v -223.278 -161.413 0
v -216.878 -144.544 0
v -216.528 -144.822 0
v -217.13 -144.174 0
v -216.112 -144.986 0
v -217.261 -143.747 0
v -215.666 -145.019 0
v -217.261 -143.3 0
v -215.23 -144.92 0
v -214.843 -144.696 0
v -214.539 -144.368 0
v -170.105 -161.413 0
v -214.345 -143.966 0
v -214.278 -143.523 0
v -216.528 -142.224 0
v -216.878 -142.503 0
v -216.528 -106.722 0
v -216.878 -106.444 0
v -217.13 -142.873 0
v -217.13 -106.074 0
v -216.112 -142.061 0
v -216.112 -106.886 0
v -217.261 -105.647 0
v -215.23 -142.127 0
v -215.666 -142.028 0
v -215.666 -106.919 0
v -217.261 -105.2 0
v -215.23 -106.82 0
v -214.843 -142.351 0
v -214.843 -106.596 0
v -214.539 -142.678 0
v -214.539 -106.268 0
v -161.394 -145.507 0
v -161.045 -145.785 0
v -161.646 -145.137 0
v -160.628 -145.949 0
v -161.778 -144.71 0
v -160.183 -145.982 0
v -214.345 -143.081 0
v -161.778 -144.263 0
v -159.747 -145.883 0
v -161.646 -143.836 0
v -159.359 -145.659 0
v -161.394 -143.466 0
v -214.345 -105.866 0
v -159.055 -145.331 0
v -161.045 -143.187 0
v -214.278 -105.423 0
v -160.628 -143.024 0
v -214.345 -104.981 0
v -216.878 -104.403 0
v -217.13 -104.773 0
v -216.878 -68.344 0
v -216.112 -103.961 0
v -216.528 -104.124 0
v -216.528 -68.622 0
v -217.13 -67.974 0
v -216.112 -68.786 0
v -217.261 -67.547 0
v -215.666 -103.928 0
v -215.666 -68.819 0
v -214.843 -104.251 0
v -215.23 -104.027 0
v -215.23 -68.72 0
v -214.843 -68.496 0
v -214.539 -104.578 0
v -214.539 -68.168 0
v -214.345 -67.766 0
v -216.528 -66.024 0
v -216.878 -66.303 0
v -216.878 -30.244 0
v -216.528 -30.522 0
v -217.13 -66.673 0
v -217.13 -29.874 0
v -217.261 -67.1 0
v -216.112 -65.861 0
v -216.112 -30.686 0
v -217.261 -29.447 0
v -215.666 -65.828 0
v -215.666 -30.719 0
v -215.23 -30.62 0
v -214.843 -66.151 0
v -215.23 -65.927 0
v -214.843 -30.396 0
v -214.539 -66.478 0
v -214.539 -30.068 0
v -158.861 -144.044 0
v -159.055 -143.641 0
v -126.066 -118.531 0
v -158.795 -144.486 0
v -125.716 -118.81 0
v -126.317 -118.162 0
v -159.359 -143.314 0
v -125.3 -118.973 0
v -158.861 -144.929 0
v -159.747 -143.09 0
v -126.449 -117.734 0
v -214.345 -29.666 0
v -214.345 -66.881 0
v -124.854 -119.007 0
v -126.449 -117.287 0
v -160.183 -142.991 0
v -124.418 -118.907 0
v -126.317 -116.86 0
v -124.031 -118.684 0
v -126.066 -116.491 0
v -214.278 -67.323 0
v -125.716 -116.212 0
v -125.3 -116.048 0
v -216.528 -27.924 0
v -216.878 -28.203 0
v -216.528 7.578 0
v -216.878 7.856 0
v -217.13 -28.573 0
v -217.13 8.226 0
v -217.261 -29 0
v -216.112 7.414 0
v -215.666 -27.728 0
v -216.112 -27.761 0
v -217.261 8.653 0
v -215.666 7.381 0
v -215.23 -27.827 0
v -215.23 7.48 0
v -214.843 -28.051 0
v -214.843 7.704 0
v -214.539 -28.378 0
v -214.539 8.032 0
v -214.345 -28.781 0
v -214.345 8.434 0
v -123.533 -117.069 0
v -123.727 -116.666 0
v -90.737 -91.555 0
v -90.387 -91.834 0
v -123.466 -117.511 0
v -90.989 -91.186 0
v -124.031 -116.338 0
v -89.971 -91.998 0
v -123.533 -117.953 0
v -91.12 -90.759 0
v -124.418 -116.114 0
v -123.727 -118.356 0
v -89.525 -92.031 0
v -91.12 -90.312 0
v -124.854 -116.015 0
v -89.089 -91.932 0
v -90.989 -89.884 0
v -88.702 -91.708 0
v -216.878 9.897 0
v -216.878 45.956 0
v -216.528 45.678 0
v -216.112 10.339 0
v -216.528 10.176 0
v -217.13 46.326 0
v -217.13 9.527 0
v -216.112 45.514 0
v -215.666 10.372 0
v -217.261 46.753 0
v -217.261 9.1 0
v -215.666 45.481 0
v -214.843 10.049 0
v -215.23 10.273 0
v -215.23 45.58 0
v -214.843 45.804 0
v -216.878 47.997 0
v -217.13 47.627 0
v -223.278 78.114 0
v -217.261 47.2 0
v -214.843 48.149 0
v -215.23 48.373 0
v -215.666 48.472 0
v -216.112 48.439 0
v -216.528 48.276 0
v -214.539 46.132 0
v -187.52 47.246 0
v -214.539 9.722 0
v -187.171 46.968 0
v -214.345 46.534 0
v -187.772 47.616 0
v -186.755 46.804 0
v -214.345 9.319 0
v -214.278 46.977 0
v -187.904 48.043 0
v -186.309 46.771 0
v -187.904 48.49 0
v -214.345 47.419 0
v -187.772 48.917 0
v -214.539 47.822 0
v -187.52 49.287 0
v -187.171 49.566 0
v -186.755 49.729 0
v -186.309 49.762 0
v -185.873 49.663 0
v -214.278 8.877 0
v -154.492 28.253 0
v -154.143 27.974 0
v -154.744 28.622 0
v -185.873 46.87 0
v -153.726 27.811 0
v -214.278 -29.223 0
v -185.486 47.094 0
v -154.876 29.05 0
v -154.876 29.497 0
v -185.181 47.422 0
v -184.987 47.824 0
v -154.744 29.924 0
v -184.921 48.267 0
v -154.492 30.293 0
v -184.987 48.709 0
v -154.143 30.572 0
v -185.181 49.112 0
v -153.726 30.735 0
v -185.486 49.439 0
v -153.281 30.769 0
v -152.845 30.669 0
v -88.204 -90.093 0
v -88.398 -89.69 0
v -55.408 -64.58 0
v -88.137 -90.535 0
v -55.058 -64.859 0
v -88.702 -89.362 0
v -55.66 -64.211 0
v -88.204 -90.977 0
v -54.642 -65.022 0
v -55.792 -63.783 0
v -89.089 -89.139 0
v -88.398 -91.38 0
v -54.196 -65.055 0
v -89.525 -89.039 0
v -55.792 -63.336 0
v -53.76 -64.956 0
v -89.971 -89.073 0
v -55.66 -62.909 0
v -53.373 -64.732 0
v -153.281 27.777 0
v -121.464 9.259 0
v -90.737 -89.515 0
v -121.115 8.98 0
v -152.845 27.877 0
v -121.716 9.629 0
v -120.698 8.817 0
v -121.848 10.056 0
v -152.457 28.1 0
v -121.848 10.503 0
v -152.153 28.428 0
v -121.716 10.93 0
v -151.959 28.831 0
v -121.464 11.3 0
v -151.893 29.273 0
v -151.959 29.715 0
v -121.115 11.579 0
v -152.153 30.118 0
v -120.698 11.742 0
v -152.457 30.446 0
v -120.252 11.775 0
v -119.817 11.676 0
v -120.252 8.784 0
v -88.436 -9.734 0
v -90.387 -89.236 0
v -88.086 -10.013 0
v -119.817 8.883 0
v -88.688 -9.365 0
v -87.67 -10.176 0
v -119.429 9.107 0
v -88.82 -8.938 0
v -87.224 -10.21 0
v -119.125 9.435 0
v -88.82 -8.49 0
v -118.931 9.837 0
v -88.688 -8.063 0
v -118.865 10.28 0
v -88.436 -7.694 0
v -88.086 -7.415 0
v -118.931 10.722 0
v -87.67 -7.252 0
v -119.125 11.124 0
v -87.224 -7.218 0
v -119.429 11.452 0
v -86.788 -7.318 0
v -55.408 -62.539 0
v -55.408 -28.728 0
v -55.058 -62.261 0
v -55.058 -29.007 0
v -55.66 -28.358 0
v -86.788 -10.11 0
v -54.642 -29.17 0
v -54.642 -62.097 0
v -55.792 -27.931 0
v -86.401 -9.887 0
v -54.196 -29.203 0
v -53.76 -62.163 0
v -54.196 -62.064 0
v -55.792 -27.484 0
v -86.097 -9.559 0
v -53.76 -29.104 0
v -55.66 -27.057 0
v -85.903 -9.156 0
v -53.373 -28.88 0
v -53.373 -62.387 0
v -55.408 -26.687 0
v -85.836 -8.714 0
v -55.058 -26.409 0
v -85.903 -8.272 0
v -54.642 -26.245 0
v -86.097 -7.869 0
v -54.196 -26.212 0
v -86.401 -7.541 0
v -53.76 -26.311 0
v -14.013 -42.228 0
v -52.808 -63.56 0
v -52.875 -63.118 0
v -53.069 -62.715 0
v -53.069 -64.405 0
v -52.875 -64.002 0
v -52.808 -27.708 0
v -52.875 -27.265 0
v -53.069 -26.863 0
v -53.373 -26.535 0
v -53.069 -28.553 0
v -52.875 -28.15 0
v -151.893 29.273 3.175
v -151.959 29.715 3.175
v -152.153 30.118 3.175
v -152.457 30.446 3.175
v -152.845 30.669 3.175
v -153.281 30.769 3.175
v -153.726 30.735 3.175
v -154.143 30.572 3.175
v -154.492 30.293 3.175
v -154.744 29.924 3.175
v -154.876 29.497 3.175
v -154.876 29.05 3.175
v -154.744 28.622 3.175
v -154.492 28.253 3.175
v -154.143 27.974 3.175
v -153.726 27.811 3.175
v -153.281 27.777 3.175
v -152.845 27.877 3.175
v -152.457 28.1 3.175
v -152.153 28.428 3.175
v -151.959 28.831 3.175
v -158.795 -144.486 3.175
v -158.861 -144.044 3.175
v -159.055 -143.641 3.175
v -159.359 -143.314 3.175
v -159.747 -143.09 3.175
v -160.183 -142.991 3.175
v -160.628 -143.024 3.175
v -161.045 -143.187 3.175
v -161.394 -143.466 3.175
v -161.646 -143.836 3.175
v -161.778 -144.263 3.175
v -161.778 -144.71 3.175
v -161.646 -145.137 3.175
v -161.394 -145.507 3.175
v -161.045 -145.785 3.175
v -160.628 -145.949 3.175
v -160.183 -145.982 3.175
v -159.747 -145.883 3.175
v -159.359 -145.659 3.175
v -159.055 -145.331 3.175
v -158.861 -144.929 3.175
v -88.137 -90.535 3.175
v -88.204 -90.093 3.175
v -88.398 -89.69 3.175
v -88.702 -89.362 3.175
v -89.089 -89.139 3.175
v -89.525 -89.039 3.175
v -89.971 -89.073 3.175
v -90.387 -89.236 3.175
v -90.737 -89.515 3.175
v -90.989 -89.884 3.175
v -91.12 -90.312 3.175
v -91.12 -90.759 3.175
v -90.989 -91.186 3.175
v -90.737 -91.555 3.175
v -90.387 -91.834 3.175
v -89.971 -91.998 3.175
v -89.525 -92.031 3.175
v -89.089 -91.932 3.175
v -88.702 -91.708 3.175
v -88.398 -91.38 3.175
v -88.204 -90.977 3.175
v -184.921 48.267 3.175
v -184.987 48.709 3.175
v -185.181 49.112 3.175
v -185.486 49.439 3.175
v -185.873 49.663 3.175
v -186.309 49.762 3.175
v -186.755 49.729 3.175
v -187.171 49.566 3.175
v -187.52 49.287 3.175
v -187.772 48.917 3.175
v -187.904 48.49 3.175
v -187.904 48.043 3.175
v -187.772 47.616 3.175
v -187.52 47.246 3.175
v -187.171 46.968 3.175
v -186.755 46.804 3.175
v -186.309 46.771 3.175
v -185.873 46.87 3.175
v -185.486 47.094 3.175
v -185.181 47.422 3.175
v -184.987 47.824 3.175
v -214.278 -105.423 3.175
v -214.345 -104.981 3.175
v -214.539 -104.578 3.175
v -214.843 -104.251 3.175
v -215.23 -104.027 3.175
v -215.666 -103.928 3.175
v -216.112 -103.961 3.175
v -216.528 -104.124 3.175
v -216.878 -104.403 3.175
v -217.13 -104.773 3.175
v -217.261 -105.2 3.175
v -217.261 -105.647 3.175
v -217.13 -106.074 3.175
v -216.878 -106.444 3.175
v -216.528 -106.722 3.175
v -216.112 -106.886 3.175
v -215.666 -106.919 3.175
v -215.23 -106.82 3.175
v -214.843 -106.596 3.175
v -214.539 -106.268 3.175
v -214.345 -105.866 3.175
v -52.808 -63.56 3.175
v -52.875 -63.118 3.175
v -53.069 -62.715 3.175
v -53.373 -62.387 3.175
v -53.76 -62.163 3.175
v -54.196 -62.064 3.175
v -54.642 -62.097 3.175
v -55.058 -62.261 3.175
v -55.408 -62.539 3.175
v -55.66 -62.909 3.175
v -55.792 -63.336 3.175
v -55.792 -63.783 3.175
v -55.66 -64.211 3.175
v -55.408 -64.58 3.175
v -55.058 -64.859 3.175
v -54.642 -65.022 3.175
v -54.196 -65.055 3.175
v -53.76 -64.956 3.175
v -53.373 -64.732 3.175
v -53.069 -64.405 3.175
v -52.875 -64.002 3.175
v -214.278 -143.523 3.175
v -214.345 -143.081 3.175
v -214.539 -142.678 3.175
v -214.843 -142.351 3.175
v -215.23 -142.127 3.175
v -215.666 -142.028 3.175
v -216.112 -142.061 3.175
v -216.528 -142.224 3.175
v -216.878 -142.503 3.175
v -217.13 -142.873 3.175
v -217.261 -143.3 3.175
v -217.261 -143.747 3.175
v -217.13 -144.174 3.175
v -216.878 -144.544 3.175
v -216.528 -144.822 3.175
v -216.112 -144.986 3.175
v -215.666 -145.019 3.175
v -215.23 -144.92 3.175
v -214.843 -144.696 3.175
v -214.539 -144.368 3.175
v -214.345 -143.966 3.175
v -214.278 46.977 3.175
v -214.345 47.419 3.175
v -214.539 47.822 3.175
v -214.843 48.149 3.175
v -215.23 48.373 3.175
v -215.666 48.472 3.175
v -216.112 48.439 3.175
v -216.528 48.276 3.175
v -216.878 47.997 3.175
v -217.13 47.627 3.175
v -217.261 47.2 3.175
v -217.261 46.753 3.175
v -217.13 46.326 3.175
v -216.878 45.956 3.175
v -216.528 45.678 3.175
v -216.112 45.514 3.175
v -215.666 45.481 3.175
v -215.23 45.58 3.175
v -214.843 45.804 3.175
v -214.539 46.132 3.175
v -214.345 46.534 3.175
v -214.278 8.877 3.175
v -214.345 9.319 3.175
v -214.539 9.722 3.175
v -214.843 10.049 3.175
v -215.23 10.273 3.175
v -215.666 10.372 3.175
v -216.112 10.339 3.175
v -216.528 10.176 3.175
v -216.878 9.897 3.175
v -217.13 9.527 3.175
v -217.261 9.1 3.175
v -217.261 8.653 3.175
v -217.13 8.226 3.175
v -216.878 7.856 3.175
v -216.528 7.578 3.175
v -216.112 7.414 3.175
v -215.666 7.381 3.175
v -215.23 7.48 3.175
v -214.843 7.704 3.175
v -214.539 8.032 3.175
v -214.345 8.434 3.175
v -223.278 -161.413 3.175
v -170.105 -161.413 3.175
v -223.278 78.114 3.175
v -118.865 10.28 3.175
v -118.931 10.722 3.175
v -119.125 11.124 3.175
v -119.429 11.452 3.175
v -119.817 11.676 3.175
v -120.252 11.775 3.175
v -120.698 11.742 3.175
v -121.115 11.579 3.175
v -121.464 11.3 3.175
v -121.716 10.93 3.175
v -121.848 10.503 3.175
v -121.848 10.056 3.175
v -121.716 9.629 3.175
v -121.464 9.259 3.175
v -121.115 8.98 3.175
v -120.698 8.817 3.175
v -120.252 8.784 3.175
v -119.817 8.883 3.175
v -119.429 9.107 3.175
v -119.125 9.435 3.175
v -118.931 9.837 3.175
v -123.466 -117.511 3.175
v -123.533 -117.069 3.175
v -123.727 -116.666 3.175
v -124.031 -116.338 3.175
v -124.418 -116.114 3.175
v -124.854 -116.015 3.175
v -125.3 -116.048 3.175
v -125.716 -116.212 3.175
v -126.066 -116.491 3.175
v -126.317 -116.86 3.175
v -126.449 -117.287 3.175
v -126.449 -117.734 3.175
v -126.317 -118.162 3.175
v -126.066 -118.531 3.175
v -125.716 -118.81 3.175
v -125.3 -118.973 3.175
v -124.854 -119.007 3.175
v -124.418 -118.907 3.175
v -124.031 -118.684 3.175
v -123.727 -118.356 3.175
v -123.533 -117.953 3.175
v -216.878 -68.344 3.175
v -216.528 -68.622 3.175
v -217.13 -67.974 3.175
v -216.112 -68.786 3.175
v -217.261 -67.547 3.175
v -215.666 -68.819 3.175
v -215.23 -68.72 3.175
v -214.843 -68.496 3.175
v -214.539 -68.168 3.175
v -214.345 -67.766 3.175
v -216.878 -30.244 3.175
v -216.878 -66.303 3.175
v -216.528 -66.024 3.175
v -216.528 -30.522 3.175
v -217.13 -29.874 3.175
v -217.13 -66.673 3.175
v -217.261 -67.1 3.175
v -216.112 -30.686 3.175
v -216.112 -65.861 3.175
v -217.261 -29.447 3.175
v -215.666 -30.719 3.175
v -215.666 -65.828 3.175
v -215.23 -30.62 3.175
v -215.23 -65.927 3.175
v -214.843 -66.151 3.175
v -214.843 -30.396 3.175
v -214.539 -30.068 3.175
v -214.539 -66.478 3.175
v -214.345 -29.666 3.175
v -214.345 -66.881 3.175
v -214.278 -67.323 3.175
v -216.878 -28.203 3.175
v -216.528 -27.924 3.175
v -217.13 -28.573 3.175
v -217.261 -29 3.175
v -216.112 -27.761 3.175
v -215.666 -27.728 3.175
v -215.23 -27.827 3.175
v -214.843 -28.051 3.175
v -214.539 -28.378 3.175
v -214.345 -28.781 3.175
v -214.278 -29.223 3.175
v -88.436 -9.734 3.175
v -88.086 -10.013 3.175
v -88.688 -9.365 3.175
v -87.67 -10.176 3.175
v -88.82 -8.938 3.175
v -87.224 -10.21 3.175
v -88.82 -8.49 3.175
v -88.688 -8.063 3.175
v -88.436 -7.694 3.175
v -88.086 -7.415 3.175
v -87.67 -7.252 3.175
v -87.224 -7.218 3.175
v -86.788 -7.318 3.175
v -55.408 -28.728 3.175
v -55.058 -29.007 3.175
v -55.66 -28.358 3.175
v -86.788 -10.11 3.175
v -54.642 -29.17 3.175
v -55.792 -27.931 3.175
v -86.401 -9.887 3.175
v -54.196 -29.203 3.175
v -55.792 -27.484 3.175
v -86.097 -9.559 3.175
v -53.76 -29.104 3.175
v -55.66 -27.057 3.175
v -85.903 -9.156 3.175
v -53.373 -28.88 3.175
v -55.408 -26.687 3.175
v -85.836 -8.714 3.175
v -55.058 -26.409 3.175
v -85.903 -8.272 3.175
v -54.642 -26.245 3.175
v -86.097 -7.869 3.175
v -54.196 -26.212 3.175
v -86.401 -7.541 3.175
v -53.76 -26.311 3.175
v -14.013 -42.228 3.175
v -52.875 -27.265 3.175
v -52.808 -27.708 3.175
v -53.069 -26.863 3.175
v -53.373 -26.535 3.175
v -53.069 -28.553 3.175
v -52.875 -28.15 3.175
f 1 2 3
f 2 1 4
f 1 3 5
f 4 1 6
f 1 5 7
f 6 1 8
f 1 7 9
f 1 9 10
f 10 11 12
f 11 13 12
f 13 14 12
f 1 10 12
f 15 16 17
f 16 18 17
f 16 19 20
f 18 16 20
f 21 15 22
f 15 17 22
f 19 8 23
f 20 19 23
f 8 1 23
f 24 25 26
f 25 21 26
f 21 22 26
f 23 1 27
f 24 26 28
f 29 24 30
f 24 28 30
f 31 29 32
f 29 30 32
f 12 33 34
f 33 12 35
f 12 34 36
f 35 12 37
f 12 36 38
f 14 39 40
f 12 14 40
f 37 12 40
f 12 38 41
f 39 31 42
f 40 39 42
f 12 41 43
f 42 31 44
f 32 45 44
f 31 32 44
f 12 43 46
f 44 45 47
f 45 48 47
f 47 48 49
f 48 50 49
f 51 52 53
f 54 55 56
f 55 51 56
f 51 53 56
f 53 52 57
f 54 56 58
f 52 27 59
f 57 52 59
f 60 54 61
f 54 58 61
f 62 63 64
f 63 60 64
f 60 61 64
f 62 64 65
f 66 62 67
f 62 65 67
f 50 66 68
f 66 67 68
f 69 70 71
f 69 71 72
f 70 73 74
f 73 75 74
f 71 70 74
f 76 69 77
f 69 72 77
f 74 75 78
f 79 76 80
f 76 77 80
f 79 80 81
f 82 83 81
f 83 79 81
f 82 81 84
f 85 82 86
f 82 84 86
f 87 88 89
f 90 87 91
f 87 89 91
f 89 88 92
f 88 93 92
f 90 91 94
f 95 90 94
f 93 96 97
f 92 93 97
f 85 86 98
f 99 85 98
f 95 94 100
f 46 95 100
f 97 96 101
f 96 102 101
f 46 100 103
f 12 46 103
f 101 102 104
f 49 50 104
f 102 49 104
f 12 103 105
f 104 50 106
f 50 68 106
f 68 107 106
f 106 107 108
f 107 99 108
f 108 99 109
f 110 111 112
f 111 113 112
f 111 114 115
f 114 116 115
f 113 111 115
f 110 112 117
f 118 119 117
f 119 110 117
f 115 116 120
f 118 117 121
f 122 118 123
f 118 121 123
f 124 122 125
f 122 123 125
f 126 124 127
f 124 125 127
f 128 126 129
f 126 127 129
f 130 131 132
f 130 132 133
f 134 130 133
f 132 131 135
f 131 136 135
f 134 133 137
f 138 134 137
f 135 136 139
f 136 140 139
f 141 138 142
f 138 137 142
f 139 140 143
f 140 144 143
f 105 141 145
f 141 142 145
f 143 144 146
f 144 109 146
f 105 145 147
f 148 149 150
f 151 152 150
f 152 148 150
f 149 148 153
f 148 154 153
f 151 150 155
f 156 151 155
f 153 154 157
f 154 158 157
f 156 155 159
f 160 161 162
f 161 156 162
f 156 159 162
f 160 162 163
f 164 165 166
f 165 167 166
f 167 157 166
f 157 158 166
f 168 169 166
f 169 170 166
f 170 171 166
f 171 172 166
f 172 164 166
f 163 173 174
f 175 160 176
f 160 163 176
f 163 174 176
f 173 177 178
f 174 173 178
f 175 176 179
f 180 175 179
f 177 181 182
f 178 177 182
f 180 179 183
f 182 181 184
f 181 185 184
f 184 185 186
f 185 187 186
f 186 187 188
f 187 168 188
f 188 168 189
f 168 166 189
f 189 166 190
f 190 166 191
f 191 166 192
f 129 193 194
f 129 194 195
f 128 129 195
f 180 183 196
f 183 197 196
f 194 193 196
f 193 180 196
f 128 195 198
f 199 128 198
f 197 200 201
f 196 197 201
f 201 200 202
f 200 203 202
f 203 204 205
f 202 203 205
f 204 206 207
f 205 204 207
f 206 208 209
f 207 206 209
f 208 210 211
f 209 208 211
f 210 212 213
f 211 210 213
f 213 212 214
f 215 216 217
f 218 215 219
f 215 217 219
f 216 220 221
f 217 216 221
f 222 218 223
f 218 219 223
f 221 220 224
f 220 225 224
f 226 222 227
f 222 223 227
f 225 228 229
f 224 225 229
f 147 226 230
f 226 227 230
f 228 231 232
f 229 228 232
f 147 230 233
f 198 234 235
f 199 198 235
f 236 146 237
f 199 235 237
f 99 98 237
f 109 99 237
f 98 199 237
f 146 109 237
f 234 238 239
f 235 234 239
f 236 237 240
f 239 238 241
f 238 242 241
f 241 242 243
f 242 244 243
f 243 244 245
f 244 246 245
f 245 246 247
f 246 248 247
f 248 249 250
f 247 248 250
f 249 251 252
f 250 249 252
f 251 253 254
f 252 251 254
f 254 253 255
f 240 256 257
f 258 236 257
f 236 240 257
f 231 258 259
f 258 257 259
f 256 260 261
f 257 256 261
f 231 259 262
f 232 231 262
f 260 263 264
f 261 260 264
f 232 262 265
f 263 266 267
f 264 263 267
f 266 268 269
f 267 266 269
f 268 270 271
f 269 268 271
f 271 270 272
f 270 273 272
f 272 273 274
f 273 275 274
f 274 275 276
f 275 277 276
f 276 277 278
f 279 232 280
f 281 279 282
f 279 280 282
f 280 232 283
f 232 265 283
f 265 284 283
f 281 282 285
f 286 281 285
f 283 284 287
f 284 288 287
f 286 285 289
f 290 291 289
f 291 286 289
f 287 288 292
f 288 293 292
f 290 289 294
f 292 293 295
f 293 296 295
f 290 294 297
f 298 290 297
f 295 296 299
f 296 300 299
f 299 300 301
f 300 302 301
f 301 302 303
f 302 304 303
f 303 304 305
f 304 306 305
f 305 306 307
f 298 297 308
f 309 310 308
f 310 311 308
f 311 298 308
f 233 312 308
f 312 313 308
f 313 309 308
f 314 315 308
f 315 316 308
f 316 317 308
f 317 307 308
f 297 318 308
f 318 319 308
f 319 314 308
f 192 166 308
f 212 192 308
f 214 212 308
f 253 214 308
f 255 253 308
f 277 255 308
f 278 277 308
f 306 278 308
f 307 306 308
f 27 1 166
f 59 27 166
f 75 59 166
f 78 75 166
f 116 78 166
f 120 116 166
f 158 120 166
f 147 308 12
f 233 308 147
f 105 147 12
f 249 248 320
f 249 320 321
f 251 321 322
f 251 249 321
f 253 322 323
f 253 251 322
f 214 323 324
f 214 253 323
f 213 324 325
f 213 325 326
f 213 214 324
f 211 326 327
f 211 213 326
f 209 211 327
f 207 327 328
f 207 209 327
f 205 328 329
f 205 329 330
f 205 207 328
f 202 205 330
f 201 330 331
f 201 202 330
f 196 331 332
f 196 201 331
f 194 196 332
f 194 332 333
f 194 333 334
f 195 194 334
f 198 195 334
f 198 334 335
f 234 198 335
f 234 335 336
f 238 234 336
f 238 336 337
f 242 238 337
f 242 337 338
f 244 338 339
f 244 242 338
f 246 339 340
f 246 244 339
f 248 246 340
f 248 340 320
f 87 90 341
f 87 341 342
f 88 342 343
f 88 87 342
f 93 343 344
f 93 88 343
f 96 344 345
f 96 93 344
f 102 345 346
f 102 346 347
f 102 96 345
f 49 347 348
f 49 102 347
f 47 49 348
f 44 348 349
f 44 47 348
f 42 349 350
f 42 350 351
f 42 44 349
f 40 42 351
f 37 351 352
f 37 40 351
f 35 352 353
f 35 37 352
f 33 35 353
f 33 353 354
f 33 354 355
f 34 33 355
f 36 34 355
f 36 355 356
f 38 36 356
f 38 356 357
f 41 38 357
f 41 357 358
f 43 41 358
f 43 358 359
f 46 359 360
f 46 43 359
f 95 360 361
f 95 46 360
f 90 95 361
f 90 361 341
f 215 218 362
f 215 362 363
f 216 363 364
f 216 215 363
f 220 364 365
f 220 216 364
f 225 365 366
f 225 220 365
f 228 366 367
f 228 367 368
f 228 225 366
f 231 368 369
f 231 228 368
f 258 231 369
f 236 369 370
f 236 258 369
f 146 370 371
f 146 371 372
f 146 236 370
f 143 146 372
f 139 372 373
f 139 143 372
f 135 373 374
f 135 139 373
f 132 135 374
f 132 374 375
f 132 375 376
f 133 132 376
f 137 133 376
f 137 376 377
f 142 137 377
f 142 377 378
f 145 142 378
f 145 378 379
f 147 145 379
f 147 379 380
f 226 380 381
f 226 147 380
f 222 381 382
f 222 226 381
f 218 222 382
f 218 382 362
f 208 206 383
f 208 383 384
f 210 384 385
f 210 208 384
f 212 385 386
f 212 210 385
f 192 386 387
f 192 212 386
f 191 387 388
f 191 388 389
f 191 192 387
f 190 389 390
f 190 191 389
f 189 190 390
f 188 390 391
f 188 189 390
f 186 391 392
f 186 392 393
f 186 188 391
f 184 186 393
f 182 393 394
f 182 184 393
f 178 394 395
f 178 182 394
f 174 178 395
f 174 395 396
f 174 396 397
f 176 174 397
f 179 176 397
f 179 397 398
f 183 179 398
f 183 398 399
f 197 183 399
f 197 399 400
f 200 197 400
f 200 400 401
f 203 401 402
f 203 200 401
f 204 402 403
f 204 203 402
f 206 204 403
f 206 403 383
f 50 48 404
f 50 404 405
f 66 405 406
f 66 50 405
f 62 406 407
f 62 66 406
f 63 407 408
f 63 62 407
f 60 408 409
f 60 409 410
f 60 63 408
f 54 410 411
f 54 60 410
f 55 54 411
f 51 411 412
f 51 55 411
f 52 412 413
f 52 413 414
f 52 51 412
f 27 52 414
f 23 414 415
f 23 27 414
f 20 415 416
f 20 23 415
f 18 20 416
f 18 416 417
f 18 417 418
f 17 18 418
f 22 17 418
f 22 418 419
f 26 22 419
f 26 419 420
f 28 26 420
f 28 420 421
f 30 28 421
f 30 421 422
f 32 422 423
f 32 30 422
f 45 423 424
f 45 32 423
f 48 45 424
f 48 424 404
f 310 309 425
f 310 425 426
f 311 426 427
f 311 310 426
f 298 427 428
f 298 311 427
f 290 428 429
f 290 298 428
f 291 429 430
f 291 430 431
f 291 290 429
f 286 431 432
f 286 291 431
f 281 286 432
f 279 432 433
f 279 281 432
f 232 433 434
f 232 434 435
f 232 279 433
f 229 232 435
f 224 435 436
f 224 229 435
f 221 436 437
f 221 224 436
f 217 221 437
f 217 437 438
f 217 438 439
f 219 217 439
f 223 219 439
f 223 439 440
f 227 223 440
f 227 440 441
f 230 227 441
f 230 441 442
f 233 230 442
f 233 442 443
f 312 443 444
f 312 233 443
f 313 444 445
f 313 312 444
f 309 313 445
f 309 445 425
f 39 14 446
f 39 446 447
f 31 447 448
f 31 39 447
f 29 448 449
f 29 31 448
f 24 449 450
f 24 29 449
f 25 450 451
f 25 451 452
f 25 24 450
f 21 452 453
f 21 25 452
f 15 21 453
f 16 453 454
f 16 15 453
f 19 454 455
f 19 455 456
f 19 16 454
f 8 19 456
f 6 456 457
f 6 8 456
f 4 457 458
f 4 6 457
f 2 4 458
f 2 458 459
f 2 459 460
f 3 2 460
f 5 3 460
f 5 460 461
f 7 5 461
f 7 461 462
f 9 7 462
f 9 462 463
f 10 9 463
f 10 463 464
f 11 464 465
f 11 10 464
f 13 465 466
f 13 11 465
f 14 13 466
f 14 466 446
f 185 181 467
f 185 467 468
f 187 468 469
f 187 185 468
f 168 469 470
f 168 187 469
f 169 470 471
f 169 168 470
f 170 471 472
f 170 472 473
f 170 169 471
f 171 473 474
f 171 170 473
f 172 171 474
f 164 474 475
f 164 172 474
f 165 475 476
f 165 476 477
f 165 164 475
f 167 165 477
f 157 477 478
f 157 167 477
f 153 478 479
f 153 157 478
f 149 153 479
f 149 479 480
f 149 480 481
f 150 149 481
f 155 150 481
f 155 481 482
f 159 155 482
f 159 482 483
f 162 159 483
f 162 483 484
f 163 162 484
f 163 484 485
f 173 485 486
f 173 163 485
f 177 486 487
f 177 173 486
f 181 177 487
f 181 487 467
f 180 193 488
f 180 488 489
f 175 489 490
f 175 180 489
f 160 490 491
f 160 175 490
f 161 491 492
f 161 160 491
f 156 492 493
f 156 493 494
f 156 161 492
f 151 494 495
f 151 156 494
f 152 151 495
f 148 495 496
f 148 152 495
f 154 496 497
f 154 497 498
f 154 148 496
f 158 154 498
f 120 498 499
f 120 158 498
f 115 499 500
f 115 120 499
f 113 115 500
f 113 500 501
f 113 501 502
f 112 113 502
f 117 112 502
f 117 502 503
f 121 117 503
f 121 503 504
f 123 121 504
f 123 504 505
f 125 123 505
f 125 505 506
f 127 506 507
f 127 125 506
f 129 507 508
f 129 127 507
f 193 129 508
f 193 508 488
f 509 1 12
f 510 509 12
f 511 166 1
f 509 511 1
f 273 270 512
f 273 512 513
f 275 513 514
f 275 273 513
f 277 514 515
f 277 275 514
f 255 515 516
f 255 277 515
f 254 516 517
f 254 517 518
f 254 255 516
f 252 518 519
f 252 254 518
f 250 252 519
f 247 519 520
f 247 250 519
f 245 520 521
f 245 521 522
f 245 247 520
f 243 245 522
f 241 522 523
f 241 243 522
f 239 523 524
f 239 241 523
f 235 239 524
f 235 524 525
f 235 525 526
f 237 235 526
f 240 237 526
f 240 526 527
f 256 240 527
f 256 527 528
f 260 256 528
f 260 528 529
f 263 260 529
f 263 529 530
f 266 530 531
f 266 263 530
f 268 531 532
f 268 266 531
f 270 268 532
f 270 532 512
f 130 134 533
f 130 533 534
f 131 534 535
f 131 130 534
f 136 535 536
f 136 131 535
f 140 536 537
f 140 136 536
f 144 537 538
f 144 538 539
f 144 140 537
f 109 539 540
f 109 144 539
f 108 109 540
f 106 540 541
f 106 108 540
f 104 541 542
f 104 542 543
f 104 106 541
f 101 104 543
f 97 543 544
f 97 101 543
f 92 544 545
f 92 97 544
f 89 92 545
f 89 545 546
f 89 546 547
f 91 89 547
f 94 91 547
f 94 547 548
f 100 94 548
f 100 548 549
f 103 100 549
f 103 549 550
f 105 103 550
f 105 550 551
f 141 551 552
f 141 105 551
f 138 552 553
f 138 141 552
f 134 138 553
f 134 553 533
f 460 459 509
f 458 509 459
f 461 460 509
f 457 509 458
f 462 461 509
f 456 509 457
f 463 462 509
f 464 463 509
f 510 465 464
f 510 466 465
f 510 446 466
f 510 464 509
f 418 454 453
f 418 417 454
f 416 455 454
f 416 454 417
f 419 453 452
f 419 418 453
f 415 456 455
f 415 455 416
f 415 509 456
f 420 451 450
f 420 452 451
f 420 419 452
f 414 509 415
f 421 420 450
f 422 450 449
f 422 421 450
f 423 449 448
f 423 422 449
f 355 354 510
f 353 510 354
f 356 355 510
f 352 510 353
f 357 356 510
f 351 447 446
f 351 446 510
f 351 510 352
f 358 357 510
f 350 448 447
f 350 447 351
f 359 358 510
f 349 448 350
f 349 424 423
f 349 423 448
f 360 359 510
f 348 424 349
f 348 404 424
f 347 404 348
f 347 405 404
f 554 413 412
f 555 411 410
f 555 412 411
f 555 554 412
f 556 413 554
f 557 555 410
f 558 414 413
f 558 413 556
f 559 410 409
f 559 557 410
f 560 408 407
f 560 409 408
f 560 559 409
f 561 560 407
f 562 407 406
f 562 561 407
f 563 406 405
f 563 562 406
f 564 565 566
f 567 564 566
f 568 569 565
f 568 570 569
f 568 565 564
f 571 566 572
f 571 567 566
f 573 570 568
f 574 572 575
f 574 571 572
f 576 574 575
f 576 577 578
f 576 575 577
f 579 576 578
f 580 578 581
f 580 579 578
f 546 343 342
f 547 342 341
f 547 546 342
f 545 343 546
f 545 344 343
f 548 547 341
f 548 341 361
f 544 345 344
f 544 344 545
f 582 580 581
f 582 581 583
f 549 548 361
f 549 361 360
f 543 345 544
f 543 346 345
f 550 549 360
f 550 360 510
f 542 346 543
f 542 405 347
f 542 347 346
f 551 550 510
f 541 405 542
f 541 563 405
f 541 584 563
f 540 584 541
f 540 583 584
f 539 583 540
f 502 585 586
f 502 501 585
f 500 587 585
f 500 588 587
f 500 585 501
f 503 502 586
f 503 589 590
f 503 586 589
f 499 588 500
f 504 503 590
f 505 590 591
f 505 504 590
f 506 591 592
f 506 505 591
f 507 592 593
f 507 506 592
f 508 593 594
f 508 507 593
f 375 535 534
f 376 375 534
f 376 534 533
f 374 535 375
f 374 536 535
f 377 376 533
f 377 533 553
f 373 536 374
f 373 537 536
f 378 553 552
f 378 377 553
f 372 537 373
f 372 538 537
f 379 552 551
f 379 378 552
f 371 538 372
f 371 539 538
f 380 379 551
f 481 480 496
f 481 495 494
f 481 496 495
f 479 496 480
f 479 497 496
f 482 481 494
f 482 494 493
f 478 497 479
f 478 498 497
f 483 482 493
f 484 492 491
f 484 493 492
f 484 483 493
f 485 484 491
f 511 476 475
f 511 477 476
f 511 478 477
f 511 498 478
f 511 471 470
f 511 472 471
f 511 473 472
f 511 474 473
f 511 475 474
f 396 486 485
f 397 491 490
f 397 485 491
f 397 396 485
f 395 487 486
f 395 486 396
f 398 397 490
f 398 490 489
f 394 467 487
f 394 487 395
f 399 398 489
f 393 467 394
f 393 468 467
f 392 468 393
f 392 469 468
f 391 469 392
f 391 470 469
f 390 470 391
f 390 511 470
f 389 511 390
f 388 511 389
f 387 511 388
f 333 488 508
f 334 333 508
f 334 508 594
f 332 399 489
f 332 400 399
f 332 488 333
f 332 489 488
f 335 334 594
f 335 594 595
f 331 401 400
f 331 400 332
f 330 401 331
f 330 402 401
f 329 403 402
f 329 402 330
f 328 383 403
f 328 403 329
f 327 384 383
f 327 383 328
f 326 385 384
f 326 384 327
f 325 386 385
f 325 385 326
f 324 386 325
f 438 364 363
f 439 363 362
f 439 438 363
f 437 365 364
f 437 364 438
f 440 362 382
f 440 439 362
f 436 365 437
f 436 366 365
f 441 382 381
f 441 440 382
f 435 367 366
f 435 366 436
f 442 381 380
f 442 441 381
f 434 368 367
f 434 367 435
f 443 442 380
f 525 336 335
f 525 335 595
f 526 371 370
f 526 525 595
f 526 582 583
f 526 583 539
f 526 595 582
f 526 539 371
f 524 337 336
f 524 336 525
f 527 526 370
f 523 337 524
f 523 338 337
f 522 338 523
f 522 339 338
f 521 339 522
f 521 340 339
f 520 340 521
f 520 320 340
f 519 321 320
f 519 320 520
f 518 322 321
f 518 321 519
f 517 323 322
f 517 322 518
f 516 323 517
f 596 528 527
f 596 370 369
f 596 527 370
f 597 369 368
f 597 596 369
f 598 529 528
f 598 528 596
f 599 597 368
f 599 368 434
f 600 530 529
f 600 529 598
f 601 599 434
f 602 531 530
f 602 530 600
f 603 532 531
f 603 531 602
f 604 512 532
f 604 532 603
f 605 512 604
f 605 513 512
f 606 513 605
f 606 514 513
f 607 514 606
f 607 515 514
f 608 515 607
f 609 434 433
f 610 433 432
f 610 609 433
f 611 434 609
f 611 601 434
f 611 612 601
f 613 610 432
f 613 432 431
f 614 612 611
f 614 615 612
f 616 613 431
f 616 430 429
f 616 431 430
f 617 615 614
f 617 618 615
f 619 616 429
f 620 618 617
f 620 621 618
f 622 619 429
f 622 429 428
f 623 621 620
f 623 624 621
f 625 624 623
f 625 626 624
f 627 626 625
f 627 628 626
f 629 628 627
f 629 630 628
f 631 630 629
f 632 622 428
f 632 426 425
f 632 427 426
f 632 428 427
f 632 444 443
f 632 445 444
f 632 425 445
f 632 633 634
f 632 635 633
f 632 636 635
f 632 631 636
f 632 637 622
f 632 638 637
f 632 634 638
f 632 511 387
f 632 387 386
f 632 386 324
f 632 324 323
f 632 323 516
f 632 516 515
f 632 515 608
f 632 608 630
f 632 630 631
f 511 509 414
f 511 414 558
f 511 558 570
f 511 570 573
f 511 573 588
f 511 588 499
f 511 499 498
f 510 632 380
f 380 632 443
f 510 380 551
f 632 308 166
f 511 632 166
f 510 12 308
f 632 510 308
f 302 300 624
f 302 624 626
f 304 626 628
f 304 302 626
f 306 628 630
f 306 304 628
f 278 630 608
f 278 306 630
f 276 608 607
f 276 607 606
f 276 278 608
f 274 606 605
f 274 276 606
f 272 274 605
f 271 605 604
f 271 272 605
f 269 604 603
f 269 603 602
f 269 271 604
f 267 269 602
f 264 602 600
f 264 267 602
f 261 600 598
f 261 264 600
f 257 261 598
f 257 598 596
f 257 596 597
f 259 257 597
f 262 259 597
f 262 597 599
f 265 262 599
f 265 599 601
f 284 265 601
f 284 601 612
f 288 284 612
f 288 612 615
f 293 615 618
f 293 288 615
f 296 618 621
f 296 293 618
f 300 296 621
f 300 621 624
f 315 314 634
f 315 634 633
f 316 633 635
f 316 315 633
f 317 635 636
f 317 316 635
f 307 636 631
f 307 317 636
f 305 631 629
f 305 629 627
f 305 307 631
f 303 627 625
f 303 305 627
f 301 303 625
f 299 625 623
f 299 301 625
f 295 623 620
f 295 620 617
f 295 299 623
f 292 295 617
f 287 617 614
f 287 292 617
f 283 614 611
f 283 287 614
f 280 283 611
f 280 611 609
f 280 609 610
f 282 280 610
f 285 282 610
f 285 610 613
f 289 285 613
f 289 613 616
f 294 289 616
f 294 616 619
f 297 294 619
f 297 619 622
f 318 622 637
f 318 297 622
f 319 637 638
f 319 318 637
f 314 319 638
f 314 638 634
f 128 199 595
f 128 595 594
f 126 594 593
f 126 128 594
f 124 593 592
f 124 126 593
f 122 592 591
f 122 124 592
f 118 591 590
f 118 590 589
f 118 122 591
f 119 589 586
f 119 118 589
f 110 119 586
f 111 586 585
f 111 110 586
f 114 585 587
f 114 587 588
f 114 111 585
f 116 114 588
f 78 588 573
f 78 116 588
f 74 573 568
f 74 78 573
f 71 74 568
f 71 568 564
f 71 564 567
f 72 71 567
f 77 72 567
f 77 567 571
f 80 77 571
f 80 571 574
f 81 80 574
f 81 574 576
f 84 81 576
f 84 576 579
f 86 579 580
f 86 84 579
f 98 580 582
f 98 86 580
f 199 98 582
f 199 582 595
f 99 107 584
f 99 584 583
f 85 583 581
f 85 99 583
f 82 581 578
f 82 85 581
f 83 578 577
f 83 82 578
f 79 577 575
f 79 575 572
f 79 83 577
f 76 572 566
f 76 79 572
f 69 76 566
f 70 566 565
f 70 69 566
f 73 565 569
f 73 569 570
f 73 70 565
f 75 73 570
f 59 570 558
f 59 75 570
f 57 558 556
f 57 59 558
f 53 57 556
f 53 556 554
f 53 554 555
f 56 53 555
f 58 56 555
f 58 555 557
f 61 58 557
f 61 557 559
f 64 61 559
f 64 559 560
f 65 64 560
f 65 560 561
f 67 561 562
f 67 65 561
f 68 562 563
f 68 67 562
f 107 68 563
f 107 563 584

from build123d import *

# Parameters (mm, degrees)
F4_DEPTH = 3.175
F3_R     = 1.5
F5_DEPTH = 3.175


with BuildPart() as f4:
    # F2 (on face) → F4 (new body)
    with BuildSketch(Plane.XY):
        Polygon((-14.01338, -42.228443), (-223.278188, 78.114037), (-223.278188, -161.413451), (-170.104977, -161.413451), align=None)
    extrude(amount=F4_DEPTH)

    # F3 (on Top) → F5 (cut)
    with BuildSketch(Plane.XY):
        with Locations((-160.294694, -144.486368)):
            Circle(F3_R)
        with Locations((-124.965932, -117.510804)):
            Circle(F3_R)
        with Locations((-89.637169, -90.53524)):
            Circle(F3_R)
        with Locations((-54.308407, -63.559676)):
            Circle(F3_R)
        with Locations((-54.308407, -27.707599)):
            Circle(F3_R)
        with Locations((-87.336499, -8.714044)):
            Circle(F3_R)
        with Locations((-120.364591, 10.27951)):
            Circle(F3_R)
        with Locations((-153.392684, 29.273065)):
            Circle(F3_R)
        with Locations((-215.778188, -143.52337)):
            Circle(F3_R)
        with Locations((-215.778188, -105.42337)):
            Circle(F3_R)
        with Locations((-215.778188, -67.32337)):
            Circle(F3_R)
        with Locations((-215.778188, -29.22337)):
            Circle(F3_R)
        with Locations((-215.778188, 46.97663)):
            Circle(F3_R)
        with Locations((-186.420776, 48.26662)):
            Circle(F3_R)
        with Locations((-215.778188, 8.87663)):
            Circle(F3_R)
    extrude(amount=F5_DEPTH, mode=Mode.SUBTRACT)


solid = f4.part
